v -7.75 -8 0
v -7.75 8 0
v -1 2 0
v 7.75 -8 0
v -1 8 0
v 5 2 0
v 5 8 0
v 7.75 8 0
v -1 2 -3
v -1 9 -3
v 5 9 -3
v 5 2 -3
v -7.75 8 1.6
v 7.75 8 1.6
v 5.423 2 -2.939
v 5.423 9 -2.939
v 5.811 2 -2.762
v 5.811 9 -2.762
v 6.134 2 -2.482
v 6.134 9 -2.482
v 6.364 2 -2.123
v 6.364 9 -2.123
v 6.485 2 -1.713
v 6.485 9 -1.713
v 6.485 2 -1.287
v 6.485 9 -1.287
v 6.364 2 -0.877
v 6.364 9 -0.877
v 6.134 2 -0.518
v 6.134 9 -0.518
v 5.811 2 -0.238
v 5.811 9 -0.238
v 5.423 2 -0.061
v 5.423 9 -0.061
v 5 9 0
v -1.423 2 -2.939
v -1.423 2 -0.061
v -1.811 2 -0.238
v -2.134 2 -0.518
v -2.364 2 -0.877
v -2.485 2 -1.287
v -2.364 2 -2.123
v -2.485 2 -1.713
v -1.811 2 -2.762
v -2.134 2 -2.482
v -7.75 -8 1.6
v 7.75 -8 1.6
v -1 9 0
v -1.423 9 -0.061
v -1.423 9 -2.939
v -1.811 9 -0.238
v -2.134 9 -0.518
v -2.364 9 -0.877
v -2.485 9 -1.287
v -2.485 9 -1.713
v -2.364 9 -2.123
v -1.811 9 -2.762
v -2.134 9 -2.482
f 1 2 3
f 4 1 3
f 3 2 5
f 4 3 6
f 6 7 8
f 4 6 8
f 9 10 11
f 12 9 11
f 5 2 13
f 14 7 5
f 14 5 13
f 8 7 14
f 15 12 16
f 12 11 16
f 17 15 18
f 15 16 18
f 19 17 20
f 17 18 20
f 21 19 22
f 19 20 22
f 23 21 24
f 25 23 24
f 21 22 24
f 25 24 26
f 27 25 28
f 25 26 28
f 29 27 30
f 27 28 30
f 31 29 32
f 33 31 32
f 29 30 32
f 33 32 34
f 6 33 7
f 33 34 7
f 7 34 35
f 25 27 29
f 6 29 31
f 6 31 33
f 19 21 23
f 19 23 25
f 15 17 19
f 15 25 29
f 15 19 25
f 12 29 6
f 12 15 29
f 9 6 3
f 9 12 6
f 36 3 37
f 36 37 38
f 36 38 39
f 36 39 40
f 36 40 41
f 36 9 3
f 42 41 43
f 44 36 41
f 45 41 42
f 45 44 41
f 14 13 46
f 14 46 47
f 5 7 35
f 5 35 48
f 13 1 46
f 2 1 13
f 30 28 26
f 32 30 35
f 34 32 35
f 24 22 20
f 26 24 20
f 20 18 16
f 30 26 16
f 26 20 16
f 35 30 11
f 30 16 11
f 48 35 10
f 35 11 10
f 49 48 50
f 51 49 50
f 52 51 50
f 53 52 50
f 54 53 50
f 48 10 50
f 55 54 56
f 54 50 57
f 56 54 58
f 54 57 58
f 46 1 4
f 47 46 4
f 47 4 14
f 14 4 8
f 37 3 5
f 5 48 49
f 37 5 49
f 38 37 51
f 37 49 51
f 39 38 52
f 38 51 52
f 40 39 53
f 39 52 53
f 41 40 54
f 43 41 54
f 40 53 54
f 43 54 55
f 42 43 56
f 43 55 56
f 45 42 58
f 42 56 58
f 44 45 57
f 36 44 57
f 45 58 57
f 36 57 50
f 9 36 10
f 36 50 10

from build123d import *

# Parameters (mm, degrees)
ESBO_O1_W                     = 15.5
ESBO_O1_H                     = 16
RESSALTO_EXTRUS_O1_DEPTH      = 1.6
RESSALTO_EXTRUS_O2_DEPTH      = 1
RESSALTO_EXTRUS_O2_DEPTH_BACK = 6


with BuildPart() as part:
    # Esboço1 → Ressalto-extrusão1 (new body)
    with BuildSketch(Plane.XY):
        Rectangle(ESBO_O1_W, ESBO_O1_H)
    extrude(amount=RESSALTO_EXTRUS_O1_DEPTH)

    # Esboço3 → Ressalto-extrusão2 (add, two sides)
    with BuildSketch(Plane(origin=(0, 8, 0), x_dir=(1, 0, 0), z_dir=(0, 1, 0))) as ressalto_extrus_o2_sk:
        with BuildLine():
            Line((-1, 3), (5, 3))
            ThreePointArc((5, 3), (6.5, 1.5), (5, 0))
            Line((5, 0), (-1, 0))
            ThreePointArc((-1, 0), (-2.5, 1.5), (-1, 3))
        make_face()
    extrude(amount=RESSALTO_EXTRUS_O2_DEPTH)
    extrude(ressalto_extrus_o2_sk.sketch, amount=-RESSALTO_EXTRUS_O2_DEPTH_BACK)


solid = part.part
